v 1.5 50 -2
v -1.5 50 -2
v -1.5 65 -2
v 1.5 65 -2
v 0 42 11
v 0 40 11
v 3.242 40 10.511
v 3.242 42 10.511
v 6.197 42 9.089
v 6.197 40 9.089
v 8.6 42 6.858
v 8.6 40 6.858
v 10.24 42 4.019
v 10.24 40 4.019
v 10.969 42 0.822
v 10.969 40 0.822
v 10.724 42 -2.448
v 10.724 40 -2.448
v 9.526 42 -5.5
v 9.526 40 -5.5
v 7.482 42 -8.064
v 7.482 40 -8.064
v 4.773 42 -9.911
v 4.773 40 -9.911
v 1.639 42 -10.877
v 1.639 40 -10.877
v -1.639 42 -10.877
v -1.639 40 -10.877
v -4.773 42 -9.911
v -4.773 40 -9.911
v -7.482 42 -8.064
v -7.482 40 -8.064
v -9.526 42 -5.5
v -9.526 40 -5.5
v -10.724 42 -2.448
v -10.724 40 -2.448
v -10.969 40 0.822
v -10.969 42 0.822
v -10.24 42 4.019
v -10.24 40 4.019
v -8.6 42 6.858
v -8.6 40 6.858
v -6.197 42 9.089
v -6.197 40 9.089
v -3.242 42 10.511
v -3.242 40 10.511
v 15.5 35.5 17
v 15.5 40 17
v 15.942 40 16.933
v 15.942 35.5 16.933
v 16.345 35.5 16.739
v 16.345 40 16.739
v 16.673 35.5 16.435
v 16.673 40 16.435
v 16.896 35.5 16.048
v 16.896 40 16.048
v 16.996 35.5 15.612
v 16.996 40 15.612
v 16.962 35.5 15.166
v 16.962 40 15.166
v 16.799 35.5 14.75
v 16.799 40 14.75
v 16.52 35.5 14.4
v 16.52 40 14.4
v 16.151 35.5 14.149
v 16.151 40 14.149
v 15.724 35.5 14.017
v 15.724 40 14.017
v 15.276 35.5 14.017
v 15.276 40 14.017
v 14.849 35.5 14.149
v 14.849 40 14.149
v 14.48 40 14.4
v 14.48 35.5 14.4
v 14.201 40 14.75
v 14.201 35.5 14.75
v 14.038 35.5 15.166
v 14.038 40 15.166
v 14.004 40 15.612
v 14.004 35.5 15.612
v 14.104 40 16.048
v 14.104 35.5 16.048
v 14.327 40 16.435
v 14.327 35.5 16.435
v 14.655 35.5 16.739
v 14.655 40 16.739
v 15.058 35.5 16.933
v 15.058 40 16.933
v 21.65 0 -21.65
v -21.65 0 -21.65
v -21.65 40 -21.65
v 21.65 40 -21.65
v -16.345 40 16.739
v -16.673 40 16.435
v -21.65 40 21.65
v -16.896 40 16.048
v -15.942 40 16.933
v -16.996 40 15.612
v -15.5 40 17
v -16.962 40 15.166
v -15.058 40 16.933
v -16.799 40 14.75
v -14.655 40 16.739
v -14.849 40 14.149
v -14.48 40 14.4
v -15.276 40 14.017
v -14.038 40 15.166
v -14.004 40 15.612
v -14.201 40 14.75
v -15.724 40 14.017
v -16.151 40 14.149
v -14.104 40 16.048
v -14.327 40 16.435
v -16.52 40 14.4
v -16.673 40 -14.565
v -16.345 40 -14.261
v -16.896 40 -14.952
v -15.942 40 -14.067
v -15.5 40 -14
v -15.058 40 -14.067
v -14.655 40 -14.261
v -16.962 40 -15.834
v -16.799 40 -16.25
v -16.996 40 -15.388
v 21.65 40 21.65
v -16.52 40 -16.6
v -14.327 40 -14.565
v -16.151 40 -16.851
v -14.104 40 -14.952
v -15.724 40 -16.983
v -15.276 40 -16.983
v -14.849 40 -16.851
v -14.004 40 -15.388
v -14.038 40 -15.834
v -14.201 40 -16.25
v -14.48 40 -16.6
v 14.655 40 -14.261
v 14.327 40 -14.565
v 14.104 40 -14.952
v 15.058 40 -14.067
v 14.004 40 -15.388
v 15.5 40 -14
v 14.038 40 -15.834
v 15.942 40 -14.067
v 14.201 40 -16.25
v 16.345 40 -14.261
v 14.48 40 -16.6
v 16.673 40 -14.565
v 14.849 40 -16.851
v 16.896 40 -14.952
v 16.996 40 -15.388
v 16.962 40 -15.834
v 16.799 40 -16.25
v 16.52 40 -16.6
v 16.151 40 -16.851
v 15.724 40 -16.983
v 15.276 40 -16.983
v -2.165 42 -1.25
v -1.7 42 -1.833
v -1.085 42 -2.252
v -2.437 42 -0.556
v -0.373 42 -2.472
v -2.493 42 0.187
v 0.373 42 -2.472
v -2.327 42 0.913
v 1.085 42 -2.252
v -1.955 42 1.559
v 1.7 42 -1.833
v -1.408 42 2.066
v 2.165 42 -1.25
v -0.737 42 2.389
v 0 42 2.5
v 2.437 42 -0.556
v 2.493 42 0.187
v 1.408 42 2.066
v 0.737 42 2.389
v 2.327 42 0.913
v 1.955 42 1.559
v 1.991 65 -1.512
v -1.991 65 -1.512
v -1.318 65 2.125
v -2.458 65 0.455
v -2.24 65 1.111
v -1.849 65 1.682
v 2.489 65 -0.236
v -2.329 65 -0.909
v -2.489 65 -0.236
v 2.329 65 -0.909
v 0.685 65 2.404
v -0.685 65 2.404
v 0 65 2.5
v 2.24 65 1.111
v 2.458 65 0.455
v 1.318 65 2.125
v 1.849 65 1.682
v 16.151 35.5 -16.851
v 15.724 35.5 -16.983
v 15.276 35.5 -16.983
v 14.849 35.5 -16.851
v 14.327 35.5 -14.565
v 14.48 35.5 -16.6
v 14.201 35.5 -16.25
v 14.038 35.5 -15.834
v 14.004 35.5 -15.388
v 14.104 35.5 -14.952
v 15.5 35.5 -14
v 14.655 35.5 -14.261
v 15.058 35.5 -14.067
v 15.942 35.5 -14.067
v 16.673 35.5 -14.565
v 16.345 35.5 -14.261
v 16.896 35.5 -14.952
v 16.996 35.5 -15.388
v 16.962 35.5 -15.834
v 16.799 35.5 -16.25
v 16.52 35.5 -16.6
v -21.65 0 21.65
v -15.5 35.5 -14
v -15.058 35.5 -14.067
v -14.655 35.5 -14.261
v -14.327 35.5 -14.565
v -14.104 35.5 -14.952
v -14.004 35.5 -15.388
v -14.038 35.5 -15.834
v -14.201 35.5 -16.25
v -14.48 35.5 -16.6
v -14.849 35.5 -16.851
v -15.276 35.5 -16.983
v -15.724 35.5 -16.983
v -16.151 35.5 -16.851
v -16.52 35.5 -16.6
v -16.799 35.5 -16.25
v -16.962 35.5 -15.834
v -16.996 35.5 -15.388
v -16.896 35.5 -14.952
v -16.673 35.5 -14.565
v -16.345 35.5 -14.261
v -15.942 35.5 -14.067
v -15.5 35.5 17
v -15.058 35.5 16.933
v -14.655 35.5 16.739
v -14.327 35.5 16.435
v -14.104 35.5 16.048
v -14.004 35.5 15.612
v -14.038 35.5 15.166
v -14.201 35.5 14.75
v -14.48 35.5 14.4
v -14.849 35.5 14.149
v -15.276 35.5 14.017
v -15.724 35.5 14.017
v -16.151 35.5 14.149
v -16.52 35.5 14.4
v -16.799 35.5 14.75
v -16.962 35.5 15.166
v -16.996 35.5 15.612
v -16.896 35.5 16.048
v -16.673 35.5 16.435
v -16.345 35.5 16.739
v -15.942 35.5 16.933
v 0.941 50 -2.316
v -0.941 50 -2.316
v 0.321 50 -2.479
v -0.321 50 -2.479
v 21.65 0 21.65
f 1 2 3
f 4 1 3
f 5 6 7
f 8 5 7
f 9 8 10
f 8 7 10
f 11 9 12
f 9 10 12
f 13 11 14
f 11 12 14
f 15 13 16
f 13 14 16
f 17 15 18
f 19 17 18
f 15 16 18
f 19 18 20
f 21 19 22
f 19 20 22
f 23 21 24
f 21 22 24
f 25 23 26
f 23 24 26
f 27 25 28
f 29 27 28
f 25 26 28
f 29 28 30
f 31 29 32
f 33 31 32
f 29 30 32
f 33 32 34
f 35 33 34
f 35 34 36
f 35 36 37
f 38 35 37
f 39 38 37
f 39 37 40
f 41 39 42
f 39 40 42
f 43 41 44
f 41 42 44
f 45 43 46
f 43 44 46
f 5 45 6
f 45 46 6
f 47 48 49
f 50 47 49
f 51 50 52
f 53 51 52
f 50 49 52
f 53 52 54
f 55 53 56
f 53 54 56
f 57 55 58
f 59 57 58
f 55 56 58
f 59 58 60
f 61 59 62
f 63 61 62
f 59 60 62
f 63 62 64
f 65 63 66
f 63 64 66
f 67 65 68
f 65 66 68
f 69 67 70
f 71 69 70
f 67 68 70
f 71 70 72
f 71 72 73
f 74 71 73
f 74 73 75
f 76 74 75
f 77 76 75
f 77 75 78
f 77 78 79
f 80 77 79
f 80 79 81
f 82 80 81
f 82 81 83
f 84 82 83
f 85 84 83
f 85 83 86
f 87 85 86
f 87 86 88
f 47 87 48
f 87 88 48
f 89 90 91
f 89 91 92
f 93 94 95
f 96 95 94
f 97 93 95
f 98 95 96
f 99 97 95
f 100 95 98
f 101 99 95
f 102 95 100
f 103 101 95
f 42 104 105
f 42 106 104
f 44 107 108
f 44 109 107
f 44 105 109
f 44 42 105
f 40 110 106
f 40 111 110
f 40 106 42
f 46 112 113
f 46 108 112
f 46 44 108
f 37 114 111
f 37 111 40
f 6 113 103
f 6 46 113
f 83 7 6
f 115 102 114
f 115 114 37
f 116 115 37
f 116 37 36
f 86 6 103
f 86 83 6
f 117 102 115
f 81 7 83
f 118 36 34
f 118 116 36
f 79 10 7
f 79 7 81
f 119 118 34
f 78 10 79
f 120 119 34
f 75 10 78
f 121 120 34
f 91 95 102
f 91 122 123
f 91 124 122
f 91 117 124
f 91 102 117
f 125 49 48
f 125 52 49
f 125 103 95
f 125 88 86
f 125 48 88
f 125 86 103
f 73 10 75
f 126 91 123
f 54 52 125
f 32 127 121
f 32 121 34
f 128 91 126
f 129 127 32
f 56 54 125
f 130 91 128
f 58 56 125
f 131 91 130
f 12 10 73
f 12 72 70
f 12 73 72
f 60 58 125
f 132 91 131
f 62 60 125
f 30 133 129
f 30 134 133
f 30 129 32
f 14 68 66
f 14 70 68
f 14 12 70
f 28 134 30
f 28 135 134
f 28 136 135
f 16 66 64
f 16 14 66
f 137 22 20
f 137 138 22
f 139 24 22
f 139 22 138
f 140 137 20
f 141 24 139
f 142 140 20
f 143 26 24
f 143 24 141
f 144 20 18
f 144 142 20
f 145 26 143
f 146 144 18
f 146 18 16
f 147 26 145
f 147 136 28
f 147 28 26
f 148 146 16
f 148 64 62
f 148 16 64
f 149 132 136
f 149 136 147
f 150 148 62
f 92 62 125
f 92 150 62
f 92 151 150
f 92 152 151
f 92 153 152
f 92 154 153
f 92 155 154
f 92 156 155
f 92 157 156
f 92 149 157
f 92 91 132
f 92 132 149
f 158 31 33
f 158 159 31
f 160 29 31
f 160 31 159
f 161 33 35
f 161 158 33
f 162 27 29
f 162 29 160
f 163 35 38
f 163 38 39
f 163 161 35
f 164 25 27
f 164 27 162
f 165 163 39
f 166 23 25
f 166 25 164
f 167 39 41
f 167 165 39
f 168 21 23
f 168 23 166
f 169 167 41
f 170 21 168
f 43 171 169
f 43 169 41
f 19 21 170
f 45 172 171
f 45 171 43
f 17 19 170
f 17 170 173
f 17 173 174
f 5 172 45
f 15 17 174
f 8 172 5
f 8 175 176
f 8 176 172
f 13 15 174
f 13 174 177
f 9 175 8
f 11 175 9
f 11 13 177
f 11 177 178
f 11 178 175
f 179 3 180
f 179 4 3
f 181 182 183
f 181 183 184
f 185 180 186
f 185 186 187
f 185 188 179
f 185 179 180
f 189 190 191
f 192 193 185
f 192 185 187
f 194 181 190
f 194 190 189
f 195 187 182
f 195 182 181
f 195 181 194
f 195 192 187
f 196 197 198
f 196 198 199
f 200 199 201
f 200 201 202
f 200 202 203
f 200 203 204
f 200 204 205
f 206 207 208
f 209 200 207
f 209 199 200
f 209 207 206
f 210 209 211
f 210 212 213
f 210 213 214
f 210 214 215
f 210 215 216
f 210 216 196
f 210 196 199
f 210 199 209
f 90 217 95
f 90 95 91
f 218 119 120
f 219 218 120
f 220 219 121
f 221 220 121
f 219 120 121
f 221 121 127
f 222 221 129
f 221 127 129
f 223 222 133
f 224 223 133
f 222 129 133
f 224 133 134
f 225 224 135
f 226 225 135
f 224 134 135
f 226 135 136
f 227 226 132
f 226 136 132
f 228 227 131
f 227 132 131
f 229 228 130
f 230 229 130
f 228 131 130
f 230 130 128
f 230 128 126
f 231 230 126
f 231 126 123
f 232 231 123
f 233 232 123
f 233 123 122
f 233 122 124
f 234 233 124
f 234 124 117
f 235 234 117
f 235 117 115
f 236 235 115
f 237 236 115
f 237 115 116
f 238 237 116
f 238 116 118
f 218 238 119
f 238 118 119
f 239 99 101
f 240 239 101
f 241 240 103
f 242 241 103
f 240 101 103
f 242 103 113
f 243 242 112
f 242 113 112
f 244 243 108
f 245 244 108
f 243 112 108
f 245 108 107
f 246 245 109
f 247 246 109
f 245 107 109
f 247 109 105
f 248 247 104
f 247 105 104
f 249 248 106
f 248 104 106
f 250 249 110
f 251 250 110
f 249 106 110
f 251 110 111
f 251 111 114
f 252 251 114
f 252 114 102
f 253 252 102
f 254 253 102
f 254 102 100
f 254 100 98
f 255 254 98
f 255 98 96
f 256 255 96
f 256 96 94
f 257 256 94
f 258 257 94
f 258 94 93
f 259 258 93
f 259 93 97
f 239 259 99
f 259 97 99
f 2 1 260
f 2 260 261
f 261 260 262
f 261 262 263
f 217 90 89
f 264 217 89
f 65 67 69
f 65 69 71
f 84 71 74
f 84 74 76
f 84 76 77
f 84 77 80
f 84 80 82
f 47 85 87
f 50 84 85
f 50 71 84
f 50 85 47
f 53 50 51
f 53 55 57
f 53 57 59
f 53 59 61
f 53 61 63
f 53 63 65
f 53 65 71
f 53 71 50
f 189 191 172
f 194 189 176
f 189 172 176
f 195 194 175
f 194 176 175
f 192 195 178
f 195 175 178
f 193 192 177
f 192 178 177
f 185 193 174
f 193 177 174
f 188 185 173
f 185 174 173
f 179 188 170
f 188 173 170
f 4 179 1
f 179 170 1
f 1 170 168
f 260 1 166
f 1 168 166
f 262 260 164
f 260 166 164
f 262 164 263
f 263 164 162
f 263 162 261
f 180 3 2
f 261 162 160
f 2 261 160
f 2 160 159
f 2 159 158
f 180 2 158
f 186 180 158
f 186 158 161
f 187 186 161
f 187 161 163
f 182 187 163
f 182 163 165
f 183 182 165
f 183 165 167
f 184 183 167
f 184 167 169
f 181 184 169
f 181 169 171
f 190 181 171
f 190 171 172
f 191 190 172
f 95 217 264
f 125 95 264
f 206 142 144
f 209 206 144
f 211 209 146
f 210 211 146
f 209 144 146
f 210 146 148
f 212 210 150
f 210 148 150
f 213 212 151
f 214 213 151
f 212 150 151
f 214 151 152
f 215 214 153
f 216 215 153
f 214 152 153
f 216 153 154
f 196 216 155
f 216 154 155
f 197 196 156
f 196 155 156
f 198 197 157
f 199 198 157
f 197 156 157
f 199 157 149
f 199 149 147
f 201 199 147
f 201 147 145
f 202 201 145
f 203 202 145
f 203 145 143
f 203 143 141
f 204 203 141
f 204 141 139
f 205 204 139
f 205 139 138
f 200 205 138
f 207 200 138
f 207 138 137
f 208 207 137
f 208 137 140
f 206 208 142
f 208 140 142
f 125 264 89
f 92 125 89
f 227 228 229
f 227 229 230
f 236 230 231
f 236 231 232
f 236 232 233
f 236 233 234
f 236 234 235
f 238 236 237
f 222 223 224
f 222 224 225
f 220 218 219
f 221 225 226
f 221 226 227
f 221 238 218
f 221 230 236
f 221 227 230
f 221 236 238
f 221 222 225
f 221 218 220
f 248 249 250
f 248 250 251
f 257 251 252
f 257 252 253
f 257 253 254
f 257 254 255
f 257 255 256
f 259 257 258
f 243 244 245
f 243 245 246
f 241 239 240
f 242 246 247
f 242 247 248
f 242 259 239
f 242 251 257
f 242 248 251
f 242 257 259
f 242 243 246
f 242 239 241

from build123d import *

# Parameters (mm, degrees)
SKETCH1_W               = 43.3
SKETCH1_H               = 43.3
BOSS_EXTRUDE1_DEPTH     = 40
SKETCH2_R               = 11
BOSS_EXTRUDE2_DEPTH     = 2
SKETCH3_R               = 2.5
BOSS_EXTRUDE3_DEPTH     = 25
CUT_EXTRUDE1_DEPTH      = 72.850156576
CUT_EXTRUDE1_DEPTH_BACK = 72.850156576
SKETCH4_W               = 0.5
SKETCH4_H               = 15
SKETCH5_R               = 1.5
CUT_EXTRUDE2_DEPTH      = 4.5


with BuildPart() as part:
    # Sketch1 → Boss-Extrude1 (new body)
    with BuildSketch(Plane(origin=(0, 0, 0), x_dir=(1, 0, 0), z_dir=(0, 1, 0))):
        Rectangle(SKETCH1_W, SKETCH1_H)
    extrude(amount=BOSS_EXTRUDE1_DEPTH)

    # Sketch2 → Boss-Extrude2 (add)
    with BuildSketch(Plane(origin=(0, 40, 0), x_dir=(1, 0, 0), z_dir=(0, 1, 0))):
        with Locations(Location((0, 0, 0), (0, 0, 270))):
            Circle(SKETCH2_R)
    extrude(amount=BOSS_EXTRUDE2_DEPTH)

    # Sketch3 → Boss-Extrude3 (add)
    with BuildSketch(Plane(origin=(0, 40, 0), x_dir=(1, 0, 0), z_dir=(0, 1, 0))):
        with Locations(Location((0, 0, 0), (0, 0, 270))):
            Circle(SKETCH3_R)
    extrude(amount=BOSS_EXTRUDE3_DEPTH)

    # Sketch4 → Cut-Extrude1 (cut, two sides: drawn at the far end of the back side and taken through both)
    with BuildSketch(Plane(origin=(0, 0, 0), x_dir=(0, 0, -1), z_dir=(1, 0, 0)).offset(-CUT_EXTRUDE1_DEPTH_BACK)):
        with Locations((2.25, 57.5)):
            Rectangle(SKETCH4_W, SKETCH4_H)
    extrude(amount=CUT_EXTRUDE1_DEPTH + CUT_EXTRUDE1_DEPTH_BACK, mode=Mode.SUBTRACT)

    # Sketch5 → Cut-Extrude2 (cut)
    with BuildSketch(Plane(origin=(0, 40, 0), x_dir=(1, 0, 0), z_dir=(0, 1, 0))):
        with Locations(Location((15.5, 15.5, 0), (0, 0, 270))):
            Circle(SKETCH5_R)
        with Locations(Location((15.5, -15.5, 0), (0, 0, 270))):
            Circle(SKETCH5_R)
        with Locations(Location((-15.5, -15.5, 0), (0, 0, 270))):
            Circle(SKETCH5_R)
        with Locations(Location((-15.5, 15.5, 0), (0, 0, 270))):
            Circle(SKETCH5_R)
    extrude(amount=-CUT_EXTRUDE2_DEPTH, mode=Mode.SUBTRACT)


solid = part.part
